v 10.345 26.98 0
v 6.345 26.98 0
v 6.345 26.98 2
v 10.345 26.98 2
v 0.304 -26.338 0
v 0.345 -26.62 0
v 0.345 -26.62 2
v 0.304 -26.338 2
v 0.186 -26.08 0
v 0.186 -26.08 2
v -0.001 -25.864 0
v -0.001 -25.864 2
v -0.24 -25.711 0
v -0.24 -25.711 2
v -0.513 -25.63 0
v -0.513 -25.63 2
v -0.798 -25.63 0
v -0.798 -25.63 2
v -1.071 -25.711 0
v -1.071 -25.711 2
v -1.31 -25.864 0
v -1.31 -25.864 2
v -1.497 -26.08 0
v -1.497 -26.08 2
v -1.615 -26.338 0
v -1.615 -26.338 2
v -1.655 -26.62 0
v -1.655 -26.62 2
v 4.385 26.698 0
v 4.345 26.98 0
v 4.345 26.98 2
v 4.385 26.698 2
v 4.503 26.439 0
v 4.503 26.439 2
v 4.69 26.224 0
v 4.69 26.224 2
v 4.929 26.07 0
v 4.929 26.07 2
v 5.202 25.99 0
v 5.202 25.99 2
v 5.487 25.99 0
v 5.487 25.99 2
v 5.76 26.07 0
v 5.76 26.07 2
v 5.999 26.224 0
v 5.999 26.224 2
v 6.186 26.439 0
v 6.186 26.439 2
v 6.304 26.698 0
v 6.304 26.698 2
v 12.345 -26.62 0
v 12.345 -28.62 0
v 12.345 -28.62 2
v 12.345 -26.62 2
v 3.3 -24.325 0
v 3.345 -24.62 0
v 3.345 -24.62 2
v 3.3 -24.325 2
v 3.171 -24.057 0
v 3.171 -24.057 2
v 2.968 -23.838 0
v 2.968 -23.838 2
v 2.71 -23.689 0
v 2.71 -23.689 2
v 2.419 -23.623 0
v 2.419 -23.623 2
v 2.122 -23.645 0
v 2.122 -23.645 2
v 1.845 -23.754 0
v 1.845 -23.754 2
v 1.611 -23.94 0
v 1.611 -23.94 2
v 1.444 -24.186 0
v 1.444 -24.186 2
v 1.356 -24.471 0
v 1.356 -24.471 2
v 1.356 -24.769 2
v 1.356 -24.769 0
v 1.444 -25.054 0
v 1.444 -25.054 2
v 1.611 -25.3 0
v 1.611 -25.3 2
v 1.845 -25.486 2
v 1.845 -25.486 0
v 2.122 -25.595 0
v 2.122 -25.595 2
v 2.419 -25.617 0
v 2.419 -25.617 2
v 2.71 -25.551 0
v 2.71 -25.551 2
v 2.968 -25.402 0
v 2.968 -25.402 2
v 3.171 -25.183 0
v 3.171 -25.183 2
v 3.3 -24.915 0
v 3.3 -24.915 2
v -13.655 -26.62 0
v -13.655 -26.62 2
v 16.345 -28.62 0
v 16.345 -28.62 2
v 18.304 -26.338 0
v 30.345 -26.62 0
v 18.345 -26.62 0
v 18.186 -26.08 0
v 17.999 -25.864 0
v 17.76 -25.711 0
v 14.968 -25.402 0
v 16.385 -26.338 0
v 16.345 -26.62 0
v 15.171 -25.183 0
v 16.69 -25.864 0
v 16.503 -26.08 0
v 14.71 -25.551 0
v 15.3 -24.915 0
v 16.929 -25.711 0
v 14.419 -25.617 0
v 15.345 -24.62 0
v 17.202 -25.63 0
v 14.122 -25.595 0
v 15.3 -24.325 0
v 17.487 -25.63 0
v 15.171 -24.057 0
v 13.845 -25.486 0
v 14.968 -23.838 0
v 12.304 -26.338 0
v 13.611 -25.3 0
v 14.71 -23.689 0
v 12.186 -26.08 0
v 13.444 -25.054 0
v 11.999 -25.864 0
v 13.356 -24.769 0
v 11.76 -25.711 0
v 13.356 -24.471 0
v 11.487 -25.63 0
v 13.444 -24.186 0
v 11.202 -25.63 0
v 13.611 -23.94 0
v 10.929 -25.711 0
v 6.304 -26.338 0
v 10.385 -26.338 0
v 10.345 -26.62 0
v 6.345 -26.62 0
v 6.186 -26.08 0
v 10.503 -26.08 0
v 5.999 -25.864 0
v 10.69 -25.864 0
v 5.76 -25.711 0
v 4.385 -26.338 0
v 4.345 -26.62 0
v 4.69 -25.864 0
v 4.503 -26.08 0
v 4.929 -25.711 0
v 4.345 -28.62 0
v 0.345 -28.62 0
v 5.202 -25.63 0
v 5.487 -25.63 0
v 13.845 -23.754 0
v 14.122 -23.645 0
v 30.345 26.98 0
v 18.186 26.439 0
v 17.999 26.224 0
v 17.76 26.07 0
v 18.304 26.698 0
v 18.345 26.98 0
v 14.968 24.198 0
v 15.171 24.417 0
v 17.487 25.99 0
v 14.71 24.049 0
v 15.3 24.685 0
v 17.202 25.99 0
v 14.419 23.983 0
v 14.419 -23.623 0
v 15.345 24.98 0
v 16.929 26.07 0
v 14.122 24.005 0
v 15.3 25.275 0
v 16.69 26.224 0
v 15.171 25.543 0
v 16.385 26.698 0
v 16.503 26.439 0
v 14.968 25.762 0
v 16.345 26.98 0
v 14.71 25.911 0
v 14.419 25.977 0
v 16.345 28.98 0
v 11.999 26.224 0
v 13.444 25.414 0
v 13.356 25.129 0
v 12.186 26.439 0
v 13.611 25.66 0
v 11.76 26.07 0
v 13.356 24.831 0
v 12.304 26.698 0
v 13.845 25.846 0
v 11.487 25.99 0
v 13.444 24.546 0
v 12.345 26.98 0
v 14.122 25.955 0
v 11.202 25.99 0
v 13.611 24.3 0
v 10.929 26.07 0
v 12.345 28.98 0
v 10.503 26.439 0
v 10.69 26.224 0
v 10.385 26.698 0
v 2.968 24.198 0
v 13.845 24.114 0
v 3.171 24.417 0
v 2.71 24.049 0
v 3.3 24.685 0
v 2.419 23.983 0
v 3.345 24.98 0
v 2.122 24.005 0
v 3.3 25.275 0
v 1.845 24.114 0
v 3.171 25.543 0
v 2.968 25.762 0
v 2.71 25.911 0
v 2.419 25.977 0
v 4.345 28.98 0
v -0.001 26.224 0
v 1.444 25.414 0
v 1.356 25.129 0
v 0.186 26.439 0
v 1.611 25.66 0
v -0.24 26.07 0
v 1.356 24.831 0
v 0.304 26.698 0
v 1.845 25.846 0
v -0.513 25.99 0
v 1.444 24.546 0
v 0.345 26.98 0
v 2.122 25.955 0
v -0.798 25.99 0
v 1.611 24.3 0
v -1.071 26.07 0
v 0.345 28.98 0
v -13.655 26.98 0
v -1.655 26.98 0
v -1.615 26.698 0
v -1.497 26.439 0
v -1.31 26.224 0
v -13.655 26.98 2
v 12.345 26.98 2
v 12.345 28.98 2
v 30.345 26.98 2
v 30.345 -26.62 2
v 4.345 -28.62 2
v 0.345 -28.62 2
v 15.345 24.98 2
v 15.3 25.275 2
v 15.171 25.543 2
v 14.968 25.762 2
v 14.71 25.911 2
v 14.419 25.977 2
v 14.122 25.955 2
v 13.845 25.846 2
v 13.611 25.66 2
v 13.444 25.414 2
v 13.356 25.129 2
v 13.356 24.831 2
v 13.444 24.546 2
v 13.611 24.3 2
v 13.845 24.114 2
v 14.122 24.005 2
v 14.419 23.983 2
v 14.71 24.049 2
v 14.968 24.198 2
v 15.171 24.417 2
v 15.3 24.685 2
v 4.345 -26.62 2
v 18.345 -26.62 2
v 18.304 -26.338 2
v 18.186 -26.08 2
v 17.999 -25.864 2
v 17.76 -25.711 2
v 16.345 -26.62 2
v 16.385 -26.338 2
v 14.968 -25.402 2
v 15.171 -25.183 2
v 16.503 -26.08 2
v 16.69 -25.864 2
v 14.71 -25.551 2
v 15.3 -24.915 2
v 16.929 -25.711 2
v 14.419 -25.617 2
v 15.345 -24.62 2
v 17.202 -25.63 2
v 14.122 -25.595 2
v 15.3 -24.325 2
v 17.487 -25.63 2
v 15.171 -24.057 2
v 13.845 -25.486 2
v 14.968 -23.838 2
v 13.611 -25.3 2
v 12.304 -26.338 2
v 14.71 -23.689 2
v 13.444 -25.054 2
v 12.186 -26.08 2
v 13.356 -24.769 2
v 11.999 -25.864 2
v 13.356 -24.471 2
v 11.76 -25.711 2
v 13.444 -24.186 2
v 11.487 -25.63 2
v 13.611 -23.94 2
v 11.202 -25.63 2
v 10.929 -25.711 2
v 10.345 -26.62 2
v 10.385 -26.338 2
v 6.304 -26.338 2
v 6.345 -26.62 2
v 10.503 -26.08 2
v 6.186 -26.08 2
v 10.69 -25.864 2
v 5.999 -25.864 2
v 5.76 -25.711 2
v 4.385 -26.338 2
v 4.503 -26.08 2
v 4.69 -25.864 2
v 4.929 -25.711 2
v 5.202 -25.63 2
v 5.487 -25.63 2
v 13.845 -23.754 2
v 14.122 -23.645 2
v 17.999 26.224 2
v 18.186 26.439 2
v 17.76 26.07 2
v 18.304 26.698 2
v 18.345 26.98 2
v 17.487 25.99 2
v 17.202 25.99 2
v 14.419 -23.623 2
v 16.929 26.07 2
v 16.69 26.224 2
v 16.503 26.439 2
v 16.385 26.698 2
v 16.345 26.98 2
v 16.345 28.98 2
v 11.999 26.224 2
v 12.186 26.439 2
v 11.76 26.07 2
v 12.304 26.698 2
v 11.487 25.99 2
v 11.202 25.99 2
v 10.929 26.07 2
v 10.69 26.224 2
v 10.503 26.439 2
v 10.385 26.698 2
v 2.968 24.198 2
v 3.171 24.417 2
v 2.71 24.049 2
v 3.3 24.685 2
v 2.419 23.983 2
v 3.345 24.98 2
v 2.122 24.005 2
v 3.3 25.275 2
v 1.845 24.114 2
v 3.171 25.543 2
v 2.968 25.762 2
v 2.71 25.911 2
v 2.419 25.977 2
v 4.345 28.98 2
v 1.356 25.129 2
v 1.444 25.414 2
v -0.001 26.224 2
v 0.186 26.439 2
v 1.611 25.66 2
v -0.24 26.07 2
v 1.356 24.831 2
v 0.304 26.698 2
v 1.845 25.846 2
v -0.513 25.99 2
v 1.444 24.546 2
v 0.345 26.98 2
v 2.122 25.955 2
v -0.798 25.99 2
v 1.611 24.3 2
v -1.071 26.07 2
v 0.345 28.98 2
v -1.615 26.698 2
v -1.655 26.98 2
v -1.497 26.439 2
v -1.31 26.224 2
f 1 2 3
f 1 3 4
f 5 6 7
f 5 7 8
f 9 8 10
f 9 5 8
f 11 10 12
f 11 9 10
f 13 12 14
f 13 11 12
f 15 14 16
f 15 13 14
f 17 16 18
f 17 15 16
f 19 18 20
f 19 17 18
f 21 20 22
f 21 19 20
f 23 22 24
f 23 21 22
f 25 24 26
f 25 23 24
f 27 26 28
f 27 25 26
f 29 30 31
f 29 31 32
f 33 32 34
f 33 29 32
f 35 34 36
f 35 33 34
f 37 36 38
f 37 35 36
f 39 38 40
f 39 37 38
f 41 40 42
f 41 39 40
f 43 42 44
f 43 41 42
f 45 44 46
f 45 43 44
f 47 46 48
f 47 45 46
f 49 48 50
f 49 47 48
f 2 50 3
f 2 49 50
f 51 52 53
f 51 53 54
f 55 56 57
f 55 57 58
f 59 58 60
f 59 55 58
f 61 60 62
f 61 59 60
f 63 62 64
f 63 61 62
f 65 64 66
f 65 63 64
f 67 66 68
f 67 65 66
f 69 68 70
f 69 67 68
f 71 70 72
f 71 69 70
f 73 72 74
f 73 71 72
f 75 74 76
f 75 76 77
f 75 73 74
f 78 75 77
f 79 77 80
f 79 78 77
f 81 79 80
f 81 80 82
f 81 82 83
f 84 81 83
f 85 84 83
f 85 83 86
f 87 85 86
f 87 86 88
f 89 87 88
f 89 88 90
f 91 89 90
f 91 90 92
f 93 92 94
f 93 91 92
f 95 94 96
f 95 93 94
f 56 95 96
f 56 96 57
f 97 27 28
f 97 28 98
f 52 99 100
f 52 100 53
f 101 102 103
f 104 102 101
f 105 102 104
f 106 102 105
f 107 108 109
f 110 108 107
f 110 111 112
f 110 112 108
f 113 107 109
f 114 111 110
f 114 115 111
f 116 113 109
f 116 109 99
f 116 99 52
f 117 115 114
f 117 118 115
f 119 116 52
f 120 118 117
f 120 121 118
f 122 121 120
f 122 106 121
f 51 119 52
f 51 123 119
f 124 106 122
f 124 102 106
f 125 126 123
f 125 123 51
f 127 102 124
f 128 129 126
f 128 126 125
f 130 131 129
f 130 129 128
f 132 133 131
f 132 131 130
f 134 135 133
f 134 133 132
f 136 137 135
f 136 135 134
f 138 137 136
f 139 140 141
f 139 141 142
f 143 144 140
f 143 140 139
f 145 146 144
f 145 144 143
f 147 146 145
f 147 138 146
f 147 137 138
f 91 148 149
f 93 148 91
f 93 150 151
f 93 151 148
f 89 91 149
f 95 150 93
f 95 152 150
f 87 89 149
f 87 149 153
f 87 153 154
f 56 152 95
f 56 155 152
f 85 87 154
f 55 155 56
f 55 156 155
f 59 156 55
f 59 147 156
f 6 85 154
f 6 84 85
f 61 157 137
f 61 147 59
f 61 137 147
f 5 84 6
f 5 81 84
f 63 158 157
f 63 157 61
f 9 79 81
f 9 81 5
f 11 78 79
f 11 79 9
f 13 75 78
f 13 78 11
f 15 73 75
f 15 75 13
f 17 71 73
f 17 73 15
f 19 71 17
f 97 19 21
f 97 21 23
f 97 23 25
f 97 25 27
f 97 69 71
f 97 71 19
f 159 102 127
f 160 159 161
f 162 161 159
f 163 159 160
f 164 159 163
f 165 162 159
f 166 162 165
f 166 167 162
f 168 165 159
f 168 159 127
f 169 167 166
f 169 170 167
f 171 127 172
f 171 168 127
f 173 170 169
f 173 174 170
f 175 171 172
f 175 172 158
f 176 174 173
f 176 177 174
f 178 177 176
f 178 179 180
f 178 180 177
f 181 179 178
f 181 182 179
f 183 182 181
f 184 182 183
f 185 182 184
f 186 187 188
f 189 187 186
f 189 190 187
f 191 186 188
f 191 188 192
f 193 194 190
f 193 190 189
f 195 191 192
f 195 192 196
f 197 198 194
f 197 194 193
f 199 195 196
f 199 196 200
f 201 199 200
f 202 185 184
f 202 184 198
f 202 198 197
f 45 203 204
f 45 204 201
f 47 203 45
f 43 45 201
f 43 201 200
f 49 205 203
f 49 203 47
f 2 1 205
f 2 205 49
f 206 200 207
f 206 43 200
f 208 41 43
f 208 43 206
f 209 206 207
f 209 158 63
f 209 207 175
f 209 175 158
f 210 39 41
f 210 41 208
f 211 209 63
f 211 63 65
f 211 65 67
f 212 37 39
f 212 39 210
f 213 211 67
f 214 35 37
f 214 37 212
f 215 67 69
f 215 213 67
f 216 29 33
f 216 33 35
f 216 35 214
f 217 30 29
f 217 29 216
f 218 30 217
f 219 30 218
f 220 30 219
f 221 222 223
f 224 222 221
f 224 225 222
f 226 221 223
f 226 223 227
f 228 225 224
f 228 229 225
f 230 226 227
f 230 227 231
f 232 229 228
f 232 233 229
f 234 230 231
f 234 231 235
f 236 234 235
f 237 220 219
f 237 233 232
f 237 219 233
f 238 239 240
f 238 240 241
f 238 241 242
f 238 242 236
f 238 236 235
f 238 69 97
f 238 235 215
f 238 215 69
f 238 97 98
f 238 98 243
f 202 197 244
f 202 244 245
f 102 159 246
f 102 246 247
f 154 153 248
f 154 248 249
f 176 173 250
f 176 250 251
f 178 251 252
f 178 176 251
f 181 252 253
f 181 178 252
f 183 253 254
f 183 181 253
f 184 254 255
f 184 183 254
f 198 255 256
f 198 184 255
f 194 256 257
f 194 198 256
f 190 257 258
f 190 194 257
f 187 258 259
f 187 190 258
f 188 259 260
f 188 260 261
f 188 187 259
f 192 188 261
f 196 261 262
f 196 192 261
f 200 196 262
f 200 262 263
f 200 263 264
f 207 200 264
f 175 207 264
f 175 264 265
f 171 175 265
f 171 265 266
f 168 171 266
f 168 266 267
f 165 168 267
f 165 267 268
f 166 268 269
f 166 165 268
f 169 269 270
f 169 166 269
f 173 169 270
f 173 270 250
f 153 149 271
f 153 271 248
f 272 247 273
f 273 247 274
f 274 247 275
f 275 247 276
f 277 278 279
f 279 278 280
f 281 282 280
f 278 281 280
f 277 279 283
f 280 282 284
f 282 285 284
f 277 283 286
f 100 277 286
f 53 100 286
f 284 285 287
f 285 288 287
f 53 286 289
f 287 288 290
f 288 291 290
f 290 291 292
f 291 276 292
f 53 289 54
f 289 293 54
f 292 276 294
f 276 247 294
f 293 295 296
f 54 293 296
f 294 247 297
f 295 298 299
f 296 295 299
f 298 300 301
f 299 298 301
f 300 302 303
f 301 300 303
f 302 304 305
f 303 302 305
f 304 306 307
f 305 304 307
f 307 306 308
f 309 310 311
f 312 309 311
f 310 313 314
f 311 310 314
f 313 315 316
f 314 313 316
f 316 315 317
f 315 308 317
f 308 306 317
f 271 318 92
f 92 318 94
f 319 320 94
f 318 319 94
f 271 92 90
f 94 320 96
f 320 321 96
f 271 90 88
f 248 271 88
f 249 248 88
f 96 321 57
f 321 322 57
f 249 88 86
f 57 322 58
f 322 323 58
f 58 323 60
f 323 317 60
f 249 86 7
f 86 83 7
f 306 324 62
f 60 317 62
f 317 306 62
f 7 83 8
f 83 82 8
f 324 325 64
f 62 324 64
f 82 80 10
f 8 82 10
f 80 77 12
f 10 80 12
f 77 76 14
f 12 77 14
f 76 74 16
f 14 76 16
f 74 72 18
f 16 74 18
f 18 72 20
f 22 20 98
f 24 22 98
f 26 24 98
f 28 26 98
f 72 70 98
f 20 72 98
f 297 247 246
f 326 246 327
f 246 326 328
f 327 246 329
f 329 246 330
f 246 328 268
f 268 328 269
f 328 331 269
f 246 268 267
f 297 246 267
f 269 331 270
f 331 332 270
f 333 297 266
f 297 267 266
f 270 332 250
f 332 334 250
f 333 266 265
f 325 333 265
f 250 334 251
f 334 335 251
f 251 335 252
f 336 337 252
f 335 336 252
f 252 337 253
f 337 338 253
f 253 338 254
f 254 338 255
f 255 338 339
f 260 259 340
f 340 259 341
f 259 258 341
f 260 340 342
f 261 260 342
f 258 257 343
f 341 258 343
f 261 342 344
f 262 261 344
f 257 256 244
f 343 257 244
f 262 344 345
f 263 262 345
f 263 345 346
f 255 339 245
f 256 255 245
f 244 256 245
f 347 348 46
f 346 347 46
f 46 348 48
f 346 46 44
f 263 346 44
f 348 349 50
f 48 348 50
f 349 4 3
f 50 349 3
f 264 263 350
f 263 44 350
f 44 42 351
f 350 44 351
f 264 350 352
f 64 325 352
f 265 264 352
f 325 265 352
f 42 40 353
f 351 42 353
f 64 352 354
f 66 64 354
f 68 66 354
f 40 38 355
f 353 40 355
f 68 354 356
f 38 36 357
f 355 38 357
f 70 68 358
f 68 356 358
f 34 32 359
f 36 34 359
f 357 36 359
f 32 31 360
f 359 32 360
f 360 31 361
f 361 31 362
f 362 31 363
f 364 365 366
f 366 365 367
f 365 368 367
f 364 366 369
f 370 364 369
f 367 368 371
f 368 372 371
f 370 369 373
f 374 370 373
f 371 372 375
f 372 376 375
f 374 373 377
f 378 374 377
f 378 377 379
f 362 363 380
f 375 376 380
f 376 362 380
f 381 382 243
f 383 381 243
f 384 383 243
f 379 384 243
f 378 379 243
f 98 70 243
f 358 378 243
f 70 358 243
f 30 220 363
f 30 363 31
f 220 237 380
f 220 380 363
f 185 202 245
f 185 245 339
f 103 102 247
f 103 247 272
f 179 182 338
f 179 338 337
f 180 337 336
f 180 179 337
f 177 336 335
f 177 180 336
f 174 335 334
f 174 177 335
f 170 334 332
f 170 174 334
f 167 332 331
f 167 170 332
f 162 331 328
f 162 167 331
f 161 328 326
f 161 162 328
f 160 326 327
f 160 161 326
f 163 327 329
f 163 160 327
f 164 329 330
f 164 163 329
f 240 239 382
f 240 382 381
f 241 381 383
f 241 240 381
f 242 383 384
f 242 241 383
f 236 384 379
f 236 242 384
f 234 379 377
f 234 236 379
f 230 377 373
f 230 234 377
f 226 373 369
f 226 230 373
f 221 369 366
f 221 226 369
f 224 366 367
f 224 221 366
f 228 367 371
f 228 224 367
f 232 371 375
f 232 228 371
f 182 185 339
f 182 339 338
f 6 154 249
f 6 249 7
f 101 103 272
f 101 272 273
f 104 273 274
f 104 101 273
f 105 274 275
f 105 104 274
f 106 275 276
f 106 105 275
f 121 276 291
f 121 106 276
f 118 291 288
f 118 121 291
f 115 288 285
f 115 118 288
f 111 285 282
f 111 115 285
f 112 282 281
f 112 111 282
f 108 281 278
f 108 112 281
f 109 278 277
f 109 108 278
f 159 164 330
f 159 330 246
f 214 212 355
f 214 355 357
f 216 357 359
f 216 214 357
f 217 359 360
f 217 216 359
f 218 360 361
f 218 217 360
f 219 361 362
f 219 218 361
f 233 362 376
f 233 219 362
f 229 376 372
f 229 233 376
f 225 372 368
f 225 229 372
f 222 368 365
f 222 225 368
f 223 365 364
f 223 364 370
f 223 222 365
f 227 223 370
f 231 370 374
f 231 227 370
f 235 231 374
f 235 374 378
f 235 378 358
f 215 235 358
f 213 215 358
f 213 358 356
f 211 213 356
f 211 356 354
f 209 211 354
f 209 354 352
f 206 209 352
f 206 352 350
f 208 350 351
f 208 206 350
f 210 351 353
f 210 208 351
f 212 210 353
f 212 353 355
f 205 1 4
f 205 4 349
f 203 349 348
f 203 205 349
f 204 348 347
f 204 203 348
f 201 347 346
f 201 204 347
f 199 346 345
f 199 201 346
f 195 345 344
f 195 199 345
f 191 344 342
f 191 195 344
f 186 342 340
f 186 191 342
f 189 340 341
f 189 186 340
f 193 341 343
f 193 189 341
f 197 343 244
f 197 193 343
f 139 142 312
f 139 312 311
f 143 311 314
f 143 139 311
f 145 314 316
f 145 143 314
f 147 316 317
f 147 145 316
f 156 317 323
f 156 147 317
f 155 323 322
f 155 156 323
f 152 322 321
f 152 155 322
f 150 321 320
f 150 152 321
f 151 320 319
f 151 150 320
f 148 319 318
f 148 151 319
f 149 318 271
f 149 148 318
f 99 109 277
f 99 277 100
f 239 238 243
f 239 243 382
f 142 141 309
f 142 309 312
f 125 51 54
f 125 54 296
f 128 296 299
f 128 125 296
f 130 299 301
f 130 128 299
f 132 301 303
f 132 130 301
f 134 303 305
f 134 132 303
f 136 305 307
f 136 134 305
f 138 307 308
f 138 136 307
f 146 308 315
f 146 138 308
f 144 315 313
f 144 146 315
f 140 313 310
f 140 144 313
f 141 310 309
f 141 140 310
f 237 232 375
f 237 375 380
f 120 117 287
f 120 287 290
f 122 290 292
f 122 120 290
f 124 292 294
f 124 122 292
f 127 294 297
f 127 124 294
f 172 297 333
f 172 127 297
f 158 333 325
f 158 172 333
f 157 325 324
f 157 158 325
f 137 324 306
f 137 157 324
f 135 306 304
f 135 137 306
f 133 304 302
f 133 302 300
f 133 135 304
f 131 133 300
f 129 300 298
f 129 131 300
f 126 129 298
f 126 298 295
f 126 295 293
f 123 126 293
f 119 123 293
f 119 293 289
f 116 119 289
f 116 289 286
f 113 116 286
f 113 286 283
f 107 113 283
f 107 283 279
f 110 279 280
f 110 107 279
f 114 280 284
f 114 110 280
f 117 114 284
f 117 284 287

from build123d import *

# Parameters (mm, degrees)
SKETCH_1_R      = 1
EXTRUDE_1_DEPTH = 2


with BuildPart() as part:
    # 草圖1 → 填料-伸長1 (new body)
    with BuildSketch(Plane.XY):
        with BuildLine():
            Line((-13.655498481, 25.979826384), (-13.655498481, 26.979826384))
            Line((-13.655498481, 26.979826384), (-12.655498481, 26.979826384))
            Line((-12.655498481, 26.979826384), (-1.655498481, 26.979826384))
            ThreePointArc((-1.655498481, 26.979826384), (-0.655498481, 25.979826384), (0.344501519, 26.979826384))
            Line((0.344501519, 26.979826384), (0.344501519, 28.979826384))
            Line((0.344501519, 28.979826384), (4.344501519, 28.979826384))
            Line((4.344501519, 28.979826384), (4.344501519, 26.979826384))
            ThreePointArc((4.344501519, 26.979826384), (5.344501519, 25.979826384), (6.344501519, 26.979826384))
            Line((6.344501519, 26.979826384), (10.344501519, 26.979826384))
            ThreePointArc((10.344501519, 26.979826384), (11.344501519, 25.979826384), (12.344501519, 26.979826384))
            Line((12.344501519, 26.979826384), (12.344501519, 28.979826384))
            Line((12.344501519, 28.979826384), (16.344501519, 28.979826384))
            Line((16.344501519, 28.979826384), (16.344501519, 26.979826384))
            ThreePointArc((16.344501519, 26.979826384), (17.344501519, 25.979826384), (18.344501519, 26.979826384))
            Line((18.344501519, 26.979826384), (29.344501519, 26.979826384))
            Line((29.344501519, 26.979826384), (30.344501519, 26.979826384))
            Line((30.344501519, 26.979826384), (30.344501519, 25.979826384))
            Line((30.344501519, 25.979826384), (30.344501519, -26.620173616))
            Line((30.344501519, -26.620173616), (29.344501519, -26.620173616))
            Line((29.344501519, -26.620173616), (18.344501519, -26.620173616))
            ThreePointArc((18.344501519, -26.620173616), (17.344501519, -25.620173616), (16.344501519, -26.620173616))
            Line((16.344501519, -26.620173616), (16.344501519, -28.620173616))
            Line((16.344501519, -28.620173616), (12.344501519, -28.620173616))
            Line((12.344501519, -28.620173616), (12.344501519, -26.620173616))
            ThreePointArc((12.344501519, -26.620173616), (11.344501519, -25.620173616), (10.344501519, -26.620173616))
            Line((10.344501519, -26.620173616), (6.344501519, -26.620173616))
            ThreePointArc((6.344501519, -26.620173616), (5.344501519, -25.620173616), (4.344501519, -26.620173616))
            Line((4.344501519, -26.620173616), (4.344501519, -28.620173616))
            Line((4.344501519, -28.620173616), (0.344501519, -28.620173616))
            Line((0.344501519, -28.620173616), (0.344501519, -26.620173616))
            ThreePointArc((0.344501519, -26.620173616), (-0.655498481, -25.620173616), (-1.655498481, -26.620173616))
            Line((-1.655498481, -26.620173616), (-12.655498481, -26.620173616))
            Line((-12.655498481, -26.620173616), (-13.655498481, -26.620173616))
            Line((-13.655498481, -26.620173616), (-13.655498481, 25.979826384))
        make_face()
        with Locations((14.344501519, 24.979826384)):
            Circle(SKETCH_1_R, mode=Mode.SUBTRACT)
        with Locations((2.344501519, -24.620173616)):
            Circle(SKETCH_1_R, mode=Mode.SUBTRACT)
        with Locations((14.344501519, -24.620173616)):
            Circle(SKETCH_1_R, mode=Mode.SUBTRACT)
        with Locations((2.344501519, 24.979826384)):
            Circle(SKETCH_1_R, mode=Mode.SUBTRACT)
    extrude(amount=EXTRUDE_1_DEPTH)


solid = part.part
